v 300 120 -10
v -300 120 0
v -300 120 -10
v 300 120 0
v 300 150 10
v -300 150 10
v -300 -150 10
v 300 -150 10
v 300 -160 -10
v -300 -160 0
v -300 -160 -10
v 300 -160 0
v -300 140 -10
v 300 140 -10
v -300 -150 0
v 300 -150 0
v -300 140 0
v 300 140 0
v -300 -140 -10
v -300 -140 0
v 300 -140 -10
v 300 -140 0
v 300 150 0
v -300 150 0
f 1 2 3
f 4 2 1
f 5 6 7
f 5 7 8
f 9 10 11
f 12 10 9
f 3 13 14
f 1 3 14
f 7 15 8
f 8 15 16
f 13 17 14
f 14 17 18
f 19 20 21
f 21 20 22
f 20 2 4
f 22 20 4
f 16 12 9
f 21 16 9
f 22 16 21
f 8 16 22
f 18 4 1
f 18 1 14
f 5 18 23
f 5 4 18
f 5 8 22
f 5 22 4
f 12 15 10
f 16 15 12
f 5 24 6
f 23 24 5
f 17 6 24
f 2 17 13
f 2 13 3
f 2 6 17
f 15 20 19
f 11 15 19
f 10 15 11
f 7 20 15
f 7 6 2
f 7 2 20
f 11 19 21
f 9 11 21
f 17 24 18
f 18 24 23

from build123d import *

# Parameters (mm, degrees)
F0_W     = 600
F0_H     = 300
F1_DEPTH = 10
F2_W     = 600
F2_H     = 10
F2_H_2   = 20
F3_DEPTH = 10


with BuildPart() as f1:
    # F0 (on Top) → F1 (new body)
    with BuildSketch(Plane.XY):
        Rectangle(F0_W, F0_H)
    extrude(amount=F1_DEPTH)

    # F2 (on face) → F3 (join)
    with BuildSketch(Plane.XY):
        with Locations((0, -145)):
            Rectangle(F2_W, F2_H)
        with Locations((0, -155)):
            Rectangle(F2_W, F2_H)
        with Locations((0, 130)):
            Rectangle(F2_W, F2_H_2)
    extrude(amount=-F3_DEPTH)


solid = f1.part
